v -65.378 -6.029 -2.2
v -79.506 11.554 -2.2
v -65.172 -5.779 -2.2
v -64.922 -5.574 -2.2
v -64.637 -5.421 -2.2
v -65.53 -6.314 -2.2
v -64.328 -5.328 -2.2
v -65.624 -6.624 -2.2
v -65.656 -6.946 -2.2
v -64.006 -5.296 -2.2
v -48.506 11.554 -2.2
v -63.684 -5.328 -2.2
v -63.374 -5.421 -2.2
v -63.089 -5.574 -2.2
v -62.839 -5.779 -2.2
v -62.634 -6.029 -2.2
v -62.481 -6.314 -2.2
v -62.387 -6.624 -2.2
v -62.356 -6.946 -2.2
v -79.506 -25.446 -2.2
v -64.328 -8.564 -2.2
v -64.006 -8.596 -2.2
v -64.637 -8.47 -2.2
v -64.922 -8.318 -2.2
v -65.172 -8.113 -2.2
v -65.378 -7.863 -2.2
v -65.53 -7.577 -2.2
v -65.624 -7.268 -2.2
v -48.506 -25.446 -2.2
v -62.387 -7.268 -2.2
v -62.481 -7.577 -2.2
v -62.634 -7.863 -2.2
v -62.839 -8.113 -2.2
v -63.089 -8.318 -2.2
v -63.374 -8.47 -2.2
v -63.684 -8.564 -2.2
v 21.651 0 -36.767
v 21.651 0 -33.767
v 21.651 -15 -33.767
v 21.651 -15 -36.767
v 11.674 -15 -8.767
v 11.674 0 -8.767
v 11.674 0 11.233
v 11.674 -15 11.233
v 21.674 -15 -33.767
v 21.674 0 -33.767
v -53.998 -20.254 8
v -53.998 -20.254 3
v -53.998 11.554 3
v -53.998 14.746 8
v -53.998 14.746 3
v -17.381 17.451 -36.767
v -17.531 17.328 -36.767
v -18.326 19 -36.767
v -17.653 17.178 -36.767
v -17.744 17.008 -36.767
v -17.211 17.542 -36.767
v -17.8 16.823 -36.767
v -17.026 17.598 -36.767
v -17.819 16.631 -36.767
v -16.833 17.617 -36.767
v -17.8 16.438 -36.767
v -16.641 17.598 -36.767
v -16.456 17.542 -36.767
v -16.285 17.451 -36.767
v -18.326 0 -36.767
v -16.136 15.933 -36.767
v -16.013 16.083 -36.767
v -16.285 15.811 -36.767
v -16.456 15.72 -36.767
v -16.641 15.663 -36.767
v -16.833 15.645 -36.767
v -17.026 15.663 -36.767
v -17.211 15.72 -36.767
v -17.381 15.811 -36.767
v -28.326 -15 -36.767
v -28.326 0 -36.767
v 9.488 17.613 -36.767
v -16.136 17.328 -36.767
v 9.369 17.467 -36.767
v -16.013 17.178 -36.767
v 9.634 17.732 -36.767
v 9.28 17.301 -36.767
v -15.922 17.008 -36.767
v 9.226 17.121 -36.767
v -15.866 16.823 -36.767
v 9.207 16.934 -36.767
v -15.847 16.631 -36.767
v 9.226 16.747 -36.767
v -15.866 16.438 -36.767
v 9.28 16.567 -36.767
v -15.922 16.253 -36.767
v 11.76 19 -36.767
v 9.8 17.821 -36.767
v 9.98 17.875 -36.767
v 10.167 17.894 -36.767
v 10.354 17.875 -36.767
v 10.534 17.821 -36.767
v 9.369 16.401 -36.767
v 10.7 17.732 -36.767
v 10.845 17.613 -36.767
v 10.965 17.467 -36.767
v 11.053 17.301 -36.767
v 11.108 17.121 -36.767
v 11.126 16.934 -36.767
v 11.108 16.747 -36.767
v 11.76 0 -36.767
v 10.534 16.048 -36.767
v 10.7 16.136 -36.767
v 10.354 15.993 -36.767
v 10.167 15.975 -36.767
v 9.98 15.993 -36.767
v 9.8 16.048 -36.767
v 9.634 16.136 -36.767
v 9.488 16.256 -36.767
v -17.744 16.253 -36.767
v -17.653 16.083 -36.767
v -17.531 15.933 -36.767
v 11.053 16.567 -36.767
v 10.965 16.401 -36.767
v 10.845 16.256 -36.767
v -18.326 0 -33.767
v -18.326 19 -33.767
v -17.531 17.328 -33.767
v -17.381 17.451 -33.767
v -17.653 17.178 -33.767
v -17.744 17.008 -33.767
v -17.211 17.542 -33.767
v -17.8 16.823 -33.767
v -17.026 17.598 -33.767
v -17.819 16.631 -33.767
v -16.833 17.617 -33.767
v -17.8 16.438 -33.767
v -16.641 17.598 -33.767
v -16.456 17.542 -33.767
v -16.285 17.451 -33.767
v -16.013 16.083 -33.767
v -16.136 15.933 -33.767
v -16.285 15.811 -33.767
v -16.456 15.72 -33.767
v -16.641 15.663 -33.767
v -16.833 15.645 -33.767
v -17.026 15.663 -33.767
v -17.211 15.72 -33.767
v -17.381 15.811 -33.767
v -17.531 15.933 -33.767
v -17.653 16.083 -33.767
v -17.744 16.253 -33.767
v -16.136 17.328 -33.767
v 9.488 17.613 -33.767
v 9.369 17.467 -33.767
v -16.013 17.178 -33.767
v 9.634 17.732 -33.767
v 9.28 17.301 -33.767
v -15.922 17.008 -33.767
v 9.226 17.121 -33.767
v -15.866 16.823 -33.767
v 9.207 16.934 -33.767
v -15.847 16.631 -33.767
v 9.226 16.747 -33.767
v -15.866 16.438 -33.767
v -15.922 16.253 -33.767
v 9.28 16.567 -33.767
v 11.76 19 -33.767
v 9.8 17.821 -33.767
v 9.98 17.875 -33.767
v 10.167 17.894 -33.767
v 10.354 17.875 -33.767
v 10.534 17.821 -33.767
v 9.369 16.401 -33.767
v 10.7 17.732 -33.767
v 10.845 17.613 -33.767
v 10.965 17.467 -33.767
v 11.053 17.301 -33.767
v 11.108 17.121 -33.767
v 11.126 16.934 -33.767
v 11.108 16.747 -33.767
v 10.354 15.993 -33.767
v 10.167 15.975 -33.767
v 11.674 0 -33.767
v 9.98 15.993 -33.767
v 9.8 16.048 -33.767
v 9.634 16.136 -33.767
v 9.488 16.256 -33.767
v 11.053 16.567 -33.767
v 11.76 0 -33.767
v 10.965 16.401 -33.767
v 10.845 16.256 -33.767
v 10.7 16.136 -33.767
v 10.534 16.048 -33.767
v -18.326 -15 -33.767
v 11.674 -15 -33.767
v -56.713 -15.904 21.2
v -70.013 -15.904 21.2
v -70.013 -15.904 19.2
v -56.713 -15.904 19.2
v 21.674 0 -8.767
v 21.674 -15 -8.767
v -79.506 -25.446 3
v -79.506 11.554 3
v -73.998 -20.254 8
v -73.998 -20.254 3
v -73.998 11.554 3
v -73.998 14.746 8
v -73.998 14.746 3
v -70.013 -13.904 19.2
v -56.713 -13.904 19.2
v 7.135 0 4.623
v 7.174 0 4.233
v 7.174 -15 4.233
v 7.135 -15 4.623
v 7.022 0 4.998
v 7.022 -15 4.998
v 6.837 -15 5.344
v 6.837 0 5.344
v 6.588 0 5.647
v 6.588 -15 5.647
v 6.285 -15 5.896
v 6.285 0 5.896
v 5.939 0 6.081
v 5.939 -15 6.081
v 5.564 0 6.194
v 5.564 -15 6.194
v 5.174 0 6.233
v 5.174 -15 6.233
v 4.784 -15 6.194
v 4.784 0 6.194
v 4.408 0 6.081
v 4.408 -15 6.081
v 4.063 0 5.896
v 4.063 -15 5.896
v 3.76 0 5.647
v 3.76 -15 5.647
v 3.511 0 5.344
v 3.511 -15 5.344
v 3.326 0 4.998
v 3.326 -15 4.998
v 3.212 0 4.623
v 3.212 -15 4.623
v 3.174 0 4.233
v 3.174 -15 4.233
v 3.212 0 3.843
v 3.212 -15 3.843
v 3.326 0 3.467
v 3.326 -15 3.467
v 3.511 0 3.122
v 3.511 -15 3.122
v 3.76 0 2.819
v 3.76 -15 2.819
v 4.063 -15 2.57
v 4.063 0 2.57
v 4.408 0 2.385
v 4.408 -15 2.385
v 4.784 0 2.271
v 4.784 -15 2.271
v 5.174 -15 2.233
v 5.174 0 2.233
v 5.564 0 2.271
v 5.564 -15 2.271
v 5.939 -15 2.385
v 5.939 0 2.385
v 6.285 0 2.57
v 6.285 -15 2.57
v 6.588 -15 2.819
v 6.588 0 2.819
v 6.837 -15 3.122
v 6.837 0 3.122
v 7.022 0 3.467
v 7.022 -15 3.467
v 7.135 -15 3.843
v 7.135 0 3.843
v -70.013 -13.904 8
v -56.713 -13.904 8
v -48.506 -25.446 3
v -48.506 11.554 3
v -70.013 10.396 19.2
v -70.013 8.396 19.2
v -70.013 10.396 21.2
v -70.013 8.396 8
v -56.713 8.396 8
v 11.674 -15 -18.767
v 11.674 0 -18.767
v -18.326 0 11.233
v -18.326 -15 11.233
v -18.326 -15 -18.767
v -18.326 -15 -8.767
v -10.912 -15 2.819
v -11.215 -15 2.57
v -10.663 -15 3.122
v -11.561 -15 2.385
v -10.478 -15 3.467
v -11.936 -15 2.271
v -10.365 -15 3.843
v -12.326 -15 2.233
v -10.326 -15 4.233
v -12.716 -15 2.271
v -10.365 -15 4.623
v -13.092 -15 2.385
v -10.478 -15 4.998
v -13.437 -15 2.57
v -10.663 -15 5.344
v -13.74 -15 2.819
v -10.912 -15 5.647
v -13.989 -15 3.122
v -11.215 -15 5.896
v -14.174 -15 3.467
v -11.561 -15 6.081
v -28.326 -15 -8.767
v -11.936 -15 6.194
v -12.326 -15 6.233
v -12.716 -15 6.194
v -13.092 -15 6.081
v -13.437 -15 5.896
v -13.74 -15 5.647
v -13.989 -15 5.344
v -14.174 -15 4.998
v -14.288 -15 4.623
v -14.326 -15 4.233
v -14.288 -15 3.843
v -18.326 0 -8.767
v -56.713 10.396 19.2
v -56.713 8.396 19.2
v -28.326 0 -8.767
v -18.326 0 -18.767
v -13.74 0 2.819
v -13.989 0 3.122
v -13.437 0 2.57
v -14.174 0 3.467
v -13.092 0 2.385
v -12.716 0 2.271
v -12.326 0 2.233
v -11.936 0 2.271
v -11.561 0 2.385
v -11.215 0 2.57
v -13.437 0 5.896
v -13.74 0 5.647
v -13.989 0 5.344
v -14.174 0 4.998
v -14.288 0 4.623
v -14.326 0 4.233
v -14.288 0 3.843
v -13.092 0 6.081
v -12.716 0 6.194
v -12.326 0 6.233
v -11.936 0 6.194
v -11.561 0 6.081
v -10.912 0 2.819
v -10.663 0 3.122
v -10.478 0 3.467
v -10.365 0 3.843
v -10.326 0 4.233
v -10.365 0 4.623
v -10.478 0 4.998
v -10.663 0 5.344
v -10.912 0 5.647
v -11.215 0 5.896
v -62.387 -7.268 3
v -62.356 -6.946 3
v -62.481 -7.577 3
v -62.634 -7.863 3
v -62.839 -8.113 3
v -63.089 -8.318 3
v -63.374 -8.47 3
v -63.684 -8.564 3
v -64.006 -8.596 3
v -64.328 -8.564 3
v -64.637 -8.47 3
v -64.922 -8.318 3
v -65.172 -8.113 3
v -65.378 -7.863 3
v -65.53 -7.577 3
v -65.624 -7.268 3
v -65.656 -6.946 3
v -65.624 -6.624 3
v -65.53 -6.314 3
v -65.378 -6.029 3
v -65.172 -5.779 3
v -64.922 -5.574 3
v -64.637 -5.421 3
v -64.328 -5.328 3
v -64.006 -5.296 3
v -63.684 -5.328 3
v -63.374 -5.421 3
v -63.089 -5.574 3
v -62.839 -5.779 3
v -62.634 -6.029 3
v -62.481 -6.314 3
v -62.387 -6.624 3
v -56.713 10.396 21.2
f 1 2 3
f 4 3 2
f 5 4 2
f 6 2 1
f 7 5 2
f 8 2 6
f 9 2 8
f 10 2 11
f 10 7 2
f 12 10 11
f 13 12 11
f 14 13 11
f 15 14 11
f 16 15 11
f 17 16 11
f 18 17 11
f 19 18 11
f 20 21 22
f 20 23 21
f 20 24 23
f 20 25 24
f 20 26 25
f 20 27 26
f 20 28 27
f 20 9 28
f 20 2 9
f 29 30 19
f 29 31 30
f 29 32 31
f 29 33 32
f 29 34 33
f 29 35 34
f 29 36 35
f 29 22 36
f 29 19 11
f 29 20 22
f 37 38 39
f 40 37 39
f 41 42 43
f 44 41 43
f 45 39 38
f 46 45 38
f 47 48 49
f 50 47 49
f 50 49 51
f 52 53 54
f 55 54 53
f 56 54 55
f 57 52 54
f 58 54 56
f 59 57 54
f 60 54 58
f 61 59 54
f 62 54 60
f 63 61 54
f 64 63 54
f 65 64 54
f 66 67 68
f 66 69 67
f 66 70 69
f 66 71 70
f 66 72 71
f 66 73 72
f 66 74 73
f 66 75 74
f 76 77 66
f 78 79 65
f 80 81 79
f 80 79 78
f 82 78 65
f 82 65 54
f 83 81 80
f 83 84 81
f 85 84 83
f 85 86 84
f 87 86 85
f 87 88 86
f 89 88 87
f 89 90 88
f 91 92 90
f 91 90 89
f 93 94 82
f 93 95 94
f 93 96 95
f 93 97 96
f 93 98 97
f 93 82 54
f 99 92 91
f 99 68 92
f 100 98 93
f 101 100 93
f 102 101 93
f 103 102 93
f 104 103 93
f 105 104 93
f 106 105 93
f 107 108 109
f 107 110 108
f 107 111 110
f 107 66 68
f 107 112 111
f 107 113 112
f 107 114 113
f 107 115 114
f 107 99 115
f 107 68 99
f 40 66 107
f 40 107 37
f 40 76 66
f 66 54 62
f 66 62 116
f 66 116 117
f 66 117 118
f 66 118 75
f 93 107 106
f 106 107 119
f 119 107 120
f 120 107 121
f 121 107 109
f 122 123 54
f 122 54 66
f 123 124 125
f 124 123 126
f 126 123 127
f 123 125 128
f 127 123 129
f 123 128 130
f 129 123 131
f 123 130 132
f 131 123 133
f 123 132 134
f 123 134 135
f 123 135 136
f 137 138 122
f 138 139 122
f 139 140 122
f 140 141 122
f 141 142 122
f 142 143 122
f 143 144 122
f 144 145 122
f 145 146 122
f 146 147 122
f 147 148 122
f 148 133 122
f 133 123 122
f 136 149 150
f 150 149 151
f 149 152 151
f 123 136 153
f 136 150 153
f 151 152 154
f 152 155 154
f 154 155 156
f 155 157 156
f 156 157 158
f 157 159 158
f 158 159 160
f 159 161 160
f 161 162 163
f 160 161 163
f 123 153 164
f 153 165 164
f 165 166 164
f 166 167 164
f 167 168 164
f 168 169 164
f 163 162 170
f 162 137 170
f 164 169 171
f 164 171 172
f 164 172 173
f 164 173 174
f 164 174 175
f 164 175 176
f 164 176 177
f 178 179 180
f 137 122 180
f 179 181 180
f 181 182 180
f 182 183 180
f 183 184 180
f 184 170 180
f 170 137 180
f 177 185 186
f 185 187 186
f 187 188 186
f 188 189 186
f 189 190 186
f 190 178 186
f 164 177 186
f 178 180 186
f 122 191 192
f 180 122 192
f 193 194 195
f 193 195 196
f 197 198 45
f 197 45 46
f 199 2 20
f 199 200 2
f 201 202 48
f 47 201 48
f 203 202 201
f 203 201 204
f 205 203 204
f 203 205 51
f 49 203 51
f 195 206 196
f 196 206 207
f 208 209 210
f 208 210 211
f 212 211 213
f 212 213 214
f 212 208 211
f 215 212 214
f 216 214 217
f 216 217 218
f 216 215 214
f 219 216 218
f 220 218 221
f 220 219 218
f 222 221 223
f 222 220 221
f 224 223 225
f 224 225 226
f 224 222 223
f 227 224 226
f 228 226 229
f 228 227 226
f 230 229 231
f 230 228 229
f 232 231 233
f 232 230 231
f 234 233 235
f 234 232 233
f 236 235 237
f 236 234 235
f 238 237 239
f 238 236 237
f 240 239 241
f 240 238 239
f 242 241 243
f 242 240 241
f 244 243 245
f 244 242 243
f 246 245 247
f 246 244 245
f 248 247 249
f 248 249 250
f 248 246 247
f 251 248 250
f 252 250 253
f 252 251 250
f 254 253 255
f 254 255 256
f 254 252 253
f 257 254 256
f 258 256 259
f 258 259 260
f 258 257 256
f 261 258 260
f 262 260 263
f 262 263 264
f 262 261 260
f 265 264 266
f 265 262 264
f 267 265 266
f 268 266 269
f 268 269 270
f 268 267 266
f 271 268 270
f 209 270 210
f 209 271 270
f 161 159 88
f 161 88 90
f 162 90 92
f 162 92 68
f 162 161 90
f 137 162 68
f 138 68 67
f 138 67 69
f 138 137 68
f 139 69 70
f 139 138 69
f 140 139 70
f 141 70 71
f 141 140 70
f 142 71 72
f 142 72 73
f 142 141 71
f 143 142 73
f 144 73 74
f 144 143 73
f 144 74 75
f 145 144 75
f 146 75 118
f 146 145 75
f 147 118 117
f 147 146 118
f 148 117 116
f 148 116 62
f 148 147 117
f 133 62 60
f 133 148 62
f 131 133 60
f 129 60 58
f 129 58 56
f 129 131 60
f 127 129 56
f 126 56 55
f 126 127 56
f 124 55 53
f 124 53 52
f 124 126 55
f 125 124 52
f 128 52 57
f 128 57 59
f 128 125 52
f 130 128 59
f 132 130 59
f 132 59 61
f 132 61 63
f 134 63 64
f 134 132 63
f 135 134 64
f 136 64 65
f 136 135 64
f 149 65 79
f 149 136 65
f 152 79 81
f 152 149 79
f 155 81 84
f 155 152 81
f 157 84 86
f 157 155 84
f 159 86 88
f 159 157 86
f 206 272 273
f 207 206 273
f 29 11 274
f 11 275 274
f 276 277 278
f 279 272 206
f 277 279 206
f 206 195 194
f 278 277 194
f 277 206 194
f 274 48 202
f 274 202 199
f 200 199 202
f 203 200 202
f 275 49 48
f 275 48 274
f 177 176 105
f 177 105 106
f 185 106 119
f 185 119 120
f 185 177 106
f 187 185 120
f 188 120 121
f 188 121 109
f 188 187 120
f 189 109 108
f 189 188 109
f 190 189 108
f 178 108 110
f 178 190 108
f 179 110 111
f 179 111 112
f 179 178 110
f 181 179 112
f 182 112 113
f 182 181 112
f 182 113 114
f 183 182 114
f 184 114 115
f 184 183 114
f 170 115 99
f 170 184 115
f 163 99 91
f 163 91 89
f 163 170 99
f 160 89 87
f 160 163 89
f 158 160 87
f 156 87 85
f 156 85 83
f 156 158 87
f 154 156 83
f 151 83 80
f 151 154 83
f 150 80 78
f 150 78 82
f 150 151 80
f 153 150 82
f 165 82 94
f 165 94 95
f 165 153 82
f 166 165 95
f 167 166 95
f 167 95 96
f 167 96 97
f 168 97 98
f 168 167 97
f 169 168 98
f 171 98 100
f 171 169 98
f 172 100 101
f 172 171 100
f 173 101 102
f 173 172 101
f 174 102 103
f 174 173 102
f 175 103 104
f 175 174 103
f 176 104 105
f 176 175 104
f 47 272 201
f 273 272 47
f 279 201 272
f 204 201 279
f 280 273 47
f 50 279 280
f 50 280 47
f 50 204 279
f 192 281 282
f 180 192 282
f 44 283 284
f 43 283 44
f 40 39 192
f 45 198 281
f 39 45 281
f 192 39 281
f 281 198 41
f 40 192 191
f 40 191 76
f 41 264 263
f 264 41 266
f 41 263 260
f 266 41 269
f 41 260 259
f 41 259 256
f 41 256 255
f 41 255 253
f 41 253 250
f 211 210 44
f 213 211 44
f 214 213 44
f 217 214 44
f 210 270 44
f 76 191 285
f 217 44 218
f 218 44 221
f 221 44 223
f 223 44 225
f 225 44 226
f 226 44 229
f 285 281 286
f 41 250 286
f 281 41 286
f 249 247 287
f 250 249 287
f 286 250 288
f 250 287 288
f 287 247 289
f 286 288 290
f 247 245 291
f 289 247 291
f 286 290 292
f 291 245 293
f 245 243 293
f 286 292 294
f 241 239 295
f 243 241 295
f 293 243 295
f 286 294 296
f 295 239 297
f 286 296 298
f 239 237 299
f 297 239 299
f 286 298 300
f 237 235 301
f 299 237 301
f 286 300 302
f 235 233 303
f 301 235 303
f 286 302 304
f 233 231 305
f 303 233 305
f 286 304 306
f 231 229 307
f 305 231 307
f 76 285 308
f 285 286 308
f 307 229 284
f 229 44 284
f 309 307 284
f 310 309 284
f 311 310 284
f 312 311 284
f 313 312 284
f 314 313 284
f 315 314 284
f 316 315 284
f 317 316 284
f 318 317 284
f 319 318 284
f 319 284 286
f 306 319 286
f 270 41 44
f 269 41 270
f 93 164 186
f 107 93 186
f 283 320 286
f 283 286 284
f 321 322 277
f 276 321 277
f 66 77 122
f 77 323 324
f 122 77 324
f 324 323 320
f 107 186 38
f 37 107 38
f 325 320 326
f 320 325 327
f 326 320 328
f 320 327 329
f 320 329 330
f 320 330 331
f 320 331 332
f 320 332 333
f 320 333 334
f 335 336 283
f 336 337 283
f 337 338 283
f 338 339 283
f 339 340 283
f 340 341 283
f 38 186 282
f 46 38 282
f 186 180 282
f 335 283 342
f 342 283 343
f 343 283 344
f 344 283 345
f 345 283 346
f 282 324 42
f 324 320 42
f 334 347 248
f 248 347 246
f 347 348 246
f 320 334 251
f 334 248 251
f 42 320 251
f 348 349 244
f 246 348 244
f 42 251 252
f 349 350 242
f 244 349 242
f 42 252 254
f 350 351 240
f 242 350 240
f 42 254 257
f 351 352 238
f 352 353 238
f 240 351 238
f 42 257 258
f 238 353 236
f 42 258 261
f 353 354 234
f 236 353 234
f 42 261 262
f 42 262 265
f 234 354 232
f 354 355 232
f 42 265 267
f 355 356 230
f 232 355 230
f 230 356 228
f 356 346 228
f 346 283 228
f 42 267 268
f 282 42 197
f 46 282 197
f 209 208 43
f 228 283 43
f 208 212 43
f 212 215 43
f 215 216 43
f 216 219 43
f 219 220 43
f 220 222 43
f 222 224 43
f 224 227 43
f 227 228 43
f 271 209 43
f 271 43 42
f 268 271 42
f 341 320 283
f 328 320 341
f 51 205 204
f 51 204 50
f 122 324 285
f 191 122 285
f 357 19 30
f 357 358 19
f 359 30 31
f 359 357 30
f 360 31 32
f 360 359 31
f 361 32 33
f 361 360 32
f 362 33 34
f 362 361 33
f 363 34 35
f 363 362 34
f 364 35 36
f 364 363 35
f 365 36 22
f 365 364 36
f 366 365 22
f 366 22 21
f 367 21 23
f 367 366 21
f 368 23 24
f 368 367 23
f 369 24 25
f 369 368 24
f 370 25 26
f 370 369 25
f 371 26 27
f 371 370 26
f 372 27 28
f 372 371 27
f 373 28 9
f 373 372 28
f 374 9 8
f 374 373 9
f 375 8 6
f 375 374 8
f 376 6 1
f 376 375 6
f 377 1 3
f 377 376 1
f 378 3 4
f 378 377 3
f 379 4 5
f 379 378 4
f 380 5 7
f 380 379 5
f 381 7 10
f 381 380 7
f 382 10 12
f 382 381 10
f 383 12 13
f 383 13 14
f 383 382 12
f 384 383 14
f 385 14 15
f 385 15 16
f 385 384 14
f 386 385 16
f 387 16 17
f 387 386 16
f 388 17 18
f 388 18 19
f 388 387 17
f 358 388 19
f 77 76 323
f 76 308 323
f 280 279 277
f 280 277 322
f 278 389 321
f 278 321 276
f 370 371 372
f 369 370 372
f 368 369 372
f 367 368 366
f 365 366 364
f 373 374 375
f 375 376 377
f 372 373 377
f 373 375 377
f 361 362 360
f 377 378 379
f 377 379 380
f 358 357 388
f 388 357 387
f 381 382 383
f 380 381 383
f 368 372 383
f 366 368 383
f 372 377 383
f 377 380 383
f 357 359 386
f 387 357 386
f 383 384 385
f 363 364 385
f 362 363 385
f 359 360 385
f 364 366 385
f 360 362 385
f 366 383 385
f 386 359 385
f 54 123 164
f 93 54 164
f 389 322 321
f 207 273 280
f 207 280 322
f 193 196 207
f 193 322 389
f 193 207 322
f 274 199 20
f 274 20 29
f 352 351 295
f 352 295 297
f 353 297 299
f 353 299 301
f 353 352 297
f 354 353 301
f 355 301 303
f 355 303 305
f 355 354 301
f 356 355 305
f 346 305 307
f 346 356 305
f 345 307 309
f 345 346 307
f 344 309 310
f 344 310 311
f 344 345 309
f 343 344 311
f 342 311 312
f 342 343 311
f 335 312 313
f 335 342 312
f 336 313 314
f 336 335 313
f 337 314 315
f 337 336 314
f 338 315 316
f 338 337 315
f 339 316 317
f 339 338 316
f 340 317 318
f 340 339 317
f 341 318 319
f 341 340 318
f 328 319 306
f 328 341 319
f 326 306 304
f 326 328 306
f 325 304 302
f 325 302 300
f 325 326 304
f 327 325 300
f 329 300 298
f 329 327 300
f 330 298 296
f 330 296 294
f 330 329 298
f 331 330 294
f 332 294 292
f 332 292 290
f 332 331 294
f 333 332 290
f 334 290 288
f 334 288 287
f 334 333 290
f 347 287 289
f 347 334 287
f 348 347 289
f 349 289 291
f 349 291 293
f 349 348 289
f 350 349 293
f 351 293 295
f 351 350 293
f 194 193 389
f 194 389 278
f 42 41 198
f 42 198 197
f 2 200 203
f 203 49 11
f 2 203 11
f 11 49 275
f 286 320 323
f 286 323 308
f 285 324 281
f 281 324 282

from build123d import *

# Parameters (mm, degrees)
F0_W      = 30
F0_H      = 30
F0_R      = 2
F1_DEPTH  = 15
F2_W      = 15
F2_H      = 25
F3_DEPTH  = 10
F4_W      = 15
F4_H      = 25
F5_DEPTH  = 10
F6_W      = 30.0859
F6_H      = 19
F6_R      = 0.986103
F6_R_2    = 0.959485
F7_DEPTH  = 3
F8_W      = 31
F8_H      = 37
F8_R      = 1.65
F9_DEPTH  = 3
F10_W     = 20
F10_H     = 35
F10_W_2   = 13.3
F10_H_2   = 22.3
F10_R     = 1.65
F11_DEPTH = 5
F12_DEPTH = 18.2
F13_W     = 13.3
F13_H     = 2
F14_DEPTH = 2
F15_W     = 13.3
F15_H     = 2
F16_DEPTH = 2
F9_FACE_W = 31
F9_FACE_H = 37
F9_FACE_R = 1.65
F17_DEPTH = 2.2


with BuildPart() as f1:
    # F0 (on Front) → F1 (new body)
    with BuildSketch(Plane.XZ):
        with Locations((-3.326248, -3.76721)):
            Rectangle(F0_W, F0_H)
        with Locations((-12.326248, 4.23279)):
            Circle(F0_R, mode=Mode.SUBTRACT)
        with Locations((5.173752, 4.23279)):
            Circle(F0_R, mode=Mode.SUBTRACT)
    extrude(amount=F1_DEPTH)

    # F2 (on face) → F3 (join)
    with BuildSketch(Plane(origin=(-18.326248, 0, 0), x_dir=(0, -1, 0), z_dir=(-1, 0, 0))):
        with Locations((7.5, -21.26721)):
            Rectangle(F2_W, F2_H)
    extrude(amount=F3_DEPTH)

    # F4 (on face) → F5 (join)
    with BuildSketch(Plane.YZ.offset(11.673752)):
        with Locations((-7.5, -21.26721)):
            Rectangle(F4_W, F4_H)
    extrude(amount=F5_DEPTH)

    # F6 (on face) → F7 (join)
    with BuildSketch(Plane(origin=(0, 0, -33.76721), x_dir=(1, 0, 0), z_dir=(0, 0, -1))):
        Polygon((21.651177, 15), (-28.326248, 15), (-28.326248, 0), (-18.326248, 0), (11.759652, 0), (21.651177, 0), align=None)
        with Locations((-3.283298, -9.5)):
            Rectangle(F6_W, F6_H)
        with Locations((-16.833282, -16.630637)):
            Circle(F6_R, mode=Mode.SUBTRACT)
        with Locations((10.166718, -16.934052)):
            Circle(F6_R_2, mode=Mode.SUBTRACT)
    extrude(amount=F7_DEPTH)


with BuildPart() as f9:
    # F8 (on Top) → F9 (new body)
    with BuildSketch(Plane.XY):
        with Locations((-64.005674, -6.945877)):
            Rectangle(F8_W, F8_H)
        with Locations((-64.005674, -6.945877)):
            Circle(F8_R, mode=Mode.SUBTRACT)
    extrude(amount=F9_DEPTH)

    # F10 (on face) → F11 (join)
    with BuildSketch(Plane.XY.offset(3)):
        with Locations((-63.998397, -2.753619)):
            Rectangle(F10_W, F10_H)
        with Locations((-63.363247, -2.753619)):
            Rectangle(F10_W_2, F10_H_2, mode=Mode.SUBTRACT)
        with Locations((-63.363247, -2.753619)):
            Rectangle(F10_W_2, F10_H_2)
        with Locations((-64.005674, -6.945877)):
            Circle(F10_R)
    extrude(amount=F11_DEPTH)

    # F10 (on face) → F12 (join)
    with BuildSketch(Plane.XY.offset(3)):
        with Locations((-63.363247, -2.753619)):
            Rectangle(F10_W_2, F10_H_2)
        with Locations((-64.005674, -6.945877)):
            Circle(F10_R, mode=Mode.SUBTRACT)
        with Locations((-64.005674, -6.945877)):
            Circle(F10_R)
    extrude(amount=F12_DEPTH)

    # F13 (on face) → F14 (join)
    with BuildSketch(Plane.XZ.offset(13.903619)):
        with Locations((-63.363247, 20.2)):
            Rectangle(F13_W, F13_H)
    extrude(amount=F14_DEPTH)

    # F15 (on face) → F16 (join)
    with BuildSketch(Plane(origin=(0, 8.396381, 0), x_dir=(-1, 0, 0), z_dir=(0, 1, 0))):
        with Locations((63.363247, 20.2)):
            Rectangle(F15_W, F15_H)
    extrude(amount=F16_DEPTH)

    # F9_face (on face) → F17 (join)
    with BuildSketch(Plane(origin=(-64.005674, -6.945877, 0), x_dir=(1, 0, 0), z_dir=(0, 0, -1))):
        Rectangle(F9_FACE_W, F9_FACE_H)
        Circle(F9_FACE_R, mode=Mode.SUBTRACT)
    extrude(amount=F17_DEPTH)


solid = Compound([f1.part, f9.part])
